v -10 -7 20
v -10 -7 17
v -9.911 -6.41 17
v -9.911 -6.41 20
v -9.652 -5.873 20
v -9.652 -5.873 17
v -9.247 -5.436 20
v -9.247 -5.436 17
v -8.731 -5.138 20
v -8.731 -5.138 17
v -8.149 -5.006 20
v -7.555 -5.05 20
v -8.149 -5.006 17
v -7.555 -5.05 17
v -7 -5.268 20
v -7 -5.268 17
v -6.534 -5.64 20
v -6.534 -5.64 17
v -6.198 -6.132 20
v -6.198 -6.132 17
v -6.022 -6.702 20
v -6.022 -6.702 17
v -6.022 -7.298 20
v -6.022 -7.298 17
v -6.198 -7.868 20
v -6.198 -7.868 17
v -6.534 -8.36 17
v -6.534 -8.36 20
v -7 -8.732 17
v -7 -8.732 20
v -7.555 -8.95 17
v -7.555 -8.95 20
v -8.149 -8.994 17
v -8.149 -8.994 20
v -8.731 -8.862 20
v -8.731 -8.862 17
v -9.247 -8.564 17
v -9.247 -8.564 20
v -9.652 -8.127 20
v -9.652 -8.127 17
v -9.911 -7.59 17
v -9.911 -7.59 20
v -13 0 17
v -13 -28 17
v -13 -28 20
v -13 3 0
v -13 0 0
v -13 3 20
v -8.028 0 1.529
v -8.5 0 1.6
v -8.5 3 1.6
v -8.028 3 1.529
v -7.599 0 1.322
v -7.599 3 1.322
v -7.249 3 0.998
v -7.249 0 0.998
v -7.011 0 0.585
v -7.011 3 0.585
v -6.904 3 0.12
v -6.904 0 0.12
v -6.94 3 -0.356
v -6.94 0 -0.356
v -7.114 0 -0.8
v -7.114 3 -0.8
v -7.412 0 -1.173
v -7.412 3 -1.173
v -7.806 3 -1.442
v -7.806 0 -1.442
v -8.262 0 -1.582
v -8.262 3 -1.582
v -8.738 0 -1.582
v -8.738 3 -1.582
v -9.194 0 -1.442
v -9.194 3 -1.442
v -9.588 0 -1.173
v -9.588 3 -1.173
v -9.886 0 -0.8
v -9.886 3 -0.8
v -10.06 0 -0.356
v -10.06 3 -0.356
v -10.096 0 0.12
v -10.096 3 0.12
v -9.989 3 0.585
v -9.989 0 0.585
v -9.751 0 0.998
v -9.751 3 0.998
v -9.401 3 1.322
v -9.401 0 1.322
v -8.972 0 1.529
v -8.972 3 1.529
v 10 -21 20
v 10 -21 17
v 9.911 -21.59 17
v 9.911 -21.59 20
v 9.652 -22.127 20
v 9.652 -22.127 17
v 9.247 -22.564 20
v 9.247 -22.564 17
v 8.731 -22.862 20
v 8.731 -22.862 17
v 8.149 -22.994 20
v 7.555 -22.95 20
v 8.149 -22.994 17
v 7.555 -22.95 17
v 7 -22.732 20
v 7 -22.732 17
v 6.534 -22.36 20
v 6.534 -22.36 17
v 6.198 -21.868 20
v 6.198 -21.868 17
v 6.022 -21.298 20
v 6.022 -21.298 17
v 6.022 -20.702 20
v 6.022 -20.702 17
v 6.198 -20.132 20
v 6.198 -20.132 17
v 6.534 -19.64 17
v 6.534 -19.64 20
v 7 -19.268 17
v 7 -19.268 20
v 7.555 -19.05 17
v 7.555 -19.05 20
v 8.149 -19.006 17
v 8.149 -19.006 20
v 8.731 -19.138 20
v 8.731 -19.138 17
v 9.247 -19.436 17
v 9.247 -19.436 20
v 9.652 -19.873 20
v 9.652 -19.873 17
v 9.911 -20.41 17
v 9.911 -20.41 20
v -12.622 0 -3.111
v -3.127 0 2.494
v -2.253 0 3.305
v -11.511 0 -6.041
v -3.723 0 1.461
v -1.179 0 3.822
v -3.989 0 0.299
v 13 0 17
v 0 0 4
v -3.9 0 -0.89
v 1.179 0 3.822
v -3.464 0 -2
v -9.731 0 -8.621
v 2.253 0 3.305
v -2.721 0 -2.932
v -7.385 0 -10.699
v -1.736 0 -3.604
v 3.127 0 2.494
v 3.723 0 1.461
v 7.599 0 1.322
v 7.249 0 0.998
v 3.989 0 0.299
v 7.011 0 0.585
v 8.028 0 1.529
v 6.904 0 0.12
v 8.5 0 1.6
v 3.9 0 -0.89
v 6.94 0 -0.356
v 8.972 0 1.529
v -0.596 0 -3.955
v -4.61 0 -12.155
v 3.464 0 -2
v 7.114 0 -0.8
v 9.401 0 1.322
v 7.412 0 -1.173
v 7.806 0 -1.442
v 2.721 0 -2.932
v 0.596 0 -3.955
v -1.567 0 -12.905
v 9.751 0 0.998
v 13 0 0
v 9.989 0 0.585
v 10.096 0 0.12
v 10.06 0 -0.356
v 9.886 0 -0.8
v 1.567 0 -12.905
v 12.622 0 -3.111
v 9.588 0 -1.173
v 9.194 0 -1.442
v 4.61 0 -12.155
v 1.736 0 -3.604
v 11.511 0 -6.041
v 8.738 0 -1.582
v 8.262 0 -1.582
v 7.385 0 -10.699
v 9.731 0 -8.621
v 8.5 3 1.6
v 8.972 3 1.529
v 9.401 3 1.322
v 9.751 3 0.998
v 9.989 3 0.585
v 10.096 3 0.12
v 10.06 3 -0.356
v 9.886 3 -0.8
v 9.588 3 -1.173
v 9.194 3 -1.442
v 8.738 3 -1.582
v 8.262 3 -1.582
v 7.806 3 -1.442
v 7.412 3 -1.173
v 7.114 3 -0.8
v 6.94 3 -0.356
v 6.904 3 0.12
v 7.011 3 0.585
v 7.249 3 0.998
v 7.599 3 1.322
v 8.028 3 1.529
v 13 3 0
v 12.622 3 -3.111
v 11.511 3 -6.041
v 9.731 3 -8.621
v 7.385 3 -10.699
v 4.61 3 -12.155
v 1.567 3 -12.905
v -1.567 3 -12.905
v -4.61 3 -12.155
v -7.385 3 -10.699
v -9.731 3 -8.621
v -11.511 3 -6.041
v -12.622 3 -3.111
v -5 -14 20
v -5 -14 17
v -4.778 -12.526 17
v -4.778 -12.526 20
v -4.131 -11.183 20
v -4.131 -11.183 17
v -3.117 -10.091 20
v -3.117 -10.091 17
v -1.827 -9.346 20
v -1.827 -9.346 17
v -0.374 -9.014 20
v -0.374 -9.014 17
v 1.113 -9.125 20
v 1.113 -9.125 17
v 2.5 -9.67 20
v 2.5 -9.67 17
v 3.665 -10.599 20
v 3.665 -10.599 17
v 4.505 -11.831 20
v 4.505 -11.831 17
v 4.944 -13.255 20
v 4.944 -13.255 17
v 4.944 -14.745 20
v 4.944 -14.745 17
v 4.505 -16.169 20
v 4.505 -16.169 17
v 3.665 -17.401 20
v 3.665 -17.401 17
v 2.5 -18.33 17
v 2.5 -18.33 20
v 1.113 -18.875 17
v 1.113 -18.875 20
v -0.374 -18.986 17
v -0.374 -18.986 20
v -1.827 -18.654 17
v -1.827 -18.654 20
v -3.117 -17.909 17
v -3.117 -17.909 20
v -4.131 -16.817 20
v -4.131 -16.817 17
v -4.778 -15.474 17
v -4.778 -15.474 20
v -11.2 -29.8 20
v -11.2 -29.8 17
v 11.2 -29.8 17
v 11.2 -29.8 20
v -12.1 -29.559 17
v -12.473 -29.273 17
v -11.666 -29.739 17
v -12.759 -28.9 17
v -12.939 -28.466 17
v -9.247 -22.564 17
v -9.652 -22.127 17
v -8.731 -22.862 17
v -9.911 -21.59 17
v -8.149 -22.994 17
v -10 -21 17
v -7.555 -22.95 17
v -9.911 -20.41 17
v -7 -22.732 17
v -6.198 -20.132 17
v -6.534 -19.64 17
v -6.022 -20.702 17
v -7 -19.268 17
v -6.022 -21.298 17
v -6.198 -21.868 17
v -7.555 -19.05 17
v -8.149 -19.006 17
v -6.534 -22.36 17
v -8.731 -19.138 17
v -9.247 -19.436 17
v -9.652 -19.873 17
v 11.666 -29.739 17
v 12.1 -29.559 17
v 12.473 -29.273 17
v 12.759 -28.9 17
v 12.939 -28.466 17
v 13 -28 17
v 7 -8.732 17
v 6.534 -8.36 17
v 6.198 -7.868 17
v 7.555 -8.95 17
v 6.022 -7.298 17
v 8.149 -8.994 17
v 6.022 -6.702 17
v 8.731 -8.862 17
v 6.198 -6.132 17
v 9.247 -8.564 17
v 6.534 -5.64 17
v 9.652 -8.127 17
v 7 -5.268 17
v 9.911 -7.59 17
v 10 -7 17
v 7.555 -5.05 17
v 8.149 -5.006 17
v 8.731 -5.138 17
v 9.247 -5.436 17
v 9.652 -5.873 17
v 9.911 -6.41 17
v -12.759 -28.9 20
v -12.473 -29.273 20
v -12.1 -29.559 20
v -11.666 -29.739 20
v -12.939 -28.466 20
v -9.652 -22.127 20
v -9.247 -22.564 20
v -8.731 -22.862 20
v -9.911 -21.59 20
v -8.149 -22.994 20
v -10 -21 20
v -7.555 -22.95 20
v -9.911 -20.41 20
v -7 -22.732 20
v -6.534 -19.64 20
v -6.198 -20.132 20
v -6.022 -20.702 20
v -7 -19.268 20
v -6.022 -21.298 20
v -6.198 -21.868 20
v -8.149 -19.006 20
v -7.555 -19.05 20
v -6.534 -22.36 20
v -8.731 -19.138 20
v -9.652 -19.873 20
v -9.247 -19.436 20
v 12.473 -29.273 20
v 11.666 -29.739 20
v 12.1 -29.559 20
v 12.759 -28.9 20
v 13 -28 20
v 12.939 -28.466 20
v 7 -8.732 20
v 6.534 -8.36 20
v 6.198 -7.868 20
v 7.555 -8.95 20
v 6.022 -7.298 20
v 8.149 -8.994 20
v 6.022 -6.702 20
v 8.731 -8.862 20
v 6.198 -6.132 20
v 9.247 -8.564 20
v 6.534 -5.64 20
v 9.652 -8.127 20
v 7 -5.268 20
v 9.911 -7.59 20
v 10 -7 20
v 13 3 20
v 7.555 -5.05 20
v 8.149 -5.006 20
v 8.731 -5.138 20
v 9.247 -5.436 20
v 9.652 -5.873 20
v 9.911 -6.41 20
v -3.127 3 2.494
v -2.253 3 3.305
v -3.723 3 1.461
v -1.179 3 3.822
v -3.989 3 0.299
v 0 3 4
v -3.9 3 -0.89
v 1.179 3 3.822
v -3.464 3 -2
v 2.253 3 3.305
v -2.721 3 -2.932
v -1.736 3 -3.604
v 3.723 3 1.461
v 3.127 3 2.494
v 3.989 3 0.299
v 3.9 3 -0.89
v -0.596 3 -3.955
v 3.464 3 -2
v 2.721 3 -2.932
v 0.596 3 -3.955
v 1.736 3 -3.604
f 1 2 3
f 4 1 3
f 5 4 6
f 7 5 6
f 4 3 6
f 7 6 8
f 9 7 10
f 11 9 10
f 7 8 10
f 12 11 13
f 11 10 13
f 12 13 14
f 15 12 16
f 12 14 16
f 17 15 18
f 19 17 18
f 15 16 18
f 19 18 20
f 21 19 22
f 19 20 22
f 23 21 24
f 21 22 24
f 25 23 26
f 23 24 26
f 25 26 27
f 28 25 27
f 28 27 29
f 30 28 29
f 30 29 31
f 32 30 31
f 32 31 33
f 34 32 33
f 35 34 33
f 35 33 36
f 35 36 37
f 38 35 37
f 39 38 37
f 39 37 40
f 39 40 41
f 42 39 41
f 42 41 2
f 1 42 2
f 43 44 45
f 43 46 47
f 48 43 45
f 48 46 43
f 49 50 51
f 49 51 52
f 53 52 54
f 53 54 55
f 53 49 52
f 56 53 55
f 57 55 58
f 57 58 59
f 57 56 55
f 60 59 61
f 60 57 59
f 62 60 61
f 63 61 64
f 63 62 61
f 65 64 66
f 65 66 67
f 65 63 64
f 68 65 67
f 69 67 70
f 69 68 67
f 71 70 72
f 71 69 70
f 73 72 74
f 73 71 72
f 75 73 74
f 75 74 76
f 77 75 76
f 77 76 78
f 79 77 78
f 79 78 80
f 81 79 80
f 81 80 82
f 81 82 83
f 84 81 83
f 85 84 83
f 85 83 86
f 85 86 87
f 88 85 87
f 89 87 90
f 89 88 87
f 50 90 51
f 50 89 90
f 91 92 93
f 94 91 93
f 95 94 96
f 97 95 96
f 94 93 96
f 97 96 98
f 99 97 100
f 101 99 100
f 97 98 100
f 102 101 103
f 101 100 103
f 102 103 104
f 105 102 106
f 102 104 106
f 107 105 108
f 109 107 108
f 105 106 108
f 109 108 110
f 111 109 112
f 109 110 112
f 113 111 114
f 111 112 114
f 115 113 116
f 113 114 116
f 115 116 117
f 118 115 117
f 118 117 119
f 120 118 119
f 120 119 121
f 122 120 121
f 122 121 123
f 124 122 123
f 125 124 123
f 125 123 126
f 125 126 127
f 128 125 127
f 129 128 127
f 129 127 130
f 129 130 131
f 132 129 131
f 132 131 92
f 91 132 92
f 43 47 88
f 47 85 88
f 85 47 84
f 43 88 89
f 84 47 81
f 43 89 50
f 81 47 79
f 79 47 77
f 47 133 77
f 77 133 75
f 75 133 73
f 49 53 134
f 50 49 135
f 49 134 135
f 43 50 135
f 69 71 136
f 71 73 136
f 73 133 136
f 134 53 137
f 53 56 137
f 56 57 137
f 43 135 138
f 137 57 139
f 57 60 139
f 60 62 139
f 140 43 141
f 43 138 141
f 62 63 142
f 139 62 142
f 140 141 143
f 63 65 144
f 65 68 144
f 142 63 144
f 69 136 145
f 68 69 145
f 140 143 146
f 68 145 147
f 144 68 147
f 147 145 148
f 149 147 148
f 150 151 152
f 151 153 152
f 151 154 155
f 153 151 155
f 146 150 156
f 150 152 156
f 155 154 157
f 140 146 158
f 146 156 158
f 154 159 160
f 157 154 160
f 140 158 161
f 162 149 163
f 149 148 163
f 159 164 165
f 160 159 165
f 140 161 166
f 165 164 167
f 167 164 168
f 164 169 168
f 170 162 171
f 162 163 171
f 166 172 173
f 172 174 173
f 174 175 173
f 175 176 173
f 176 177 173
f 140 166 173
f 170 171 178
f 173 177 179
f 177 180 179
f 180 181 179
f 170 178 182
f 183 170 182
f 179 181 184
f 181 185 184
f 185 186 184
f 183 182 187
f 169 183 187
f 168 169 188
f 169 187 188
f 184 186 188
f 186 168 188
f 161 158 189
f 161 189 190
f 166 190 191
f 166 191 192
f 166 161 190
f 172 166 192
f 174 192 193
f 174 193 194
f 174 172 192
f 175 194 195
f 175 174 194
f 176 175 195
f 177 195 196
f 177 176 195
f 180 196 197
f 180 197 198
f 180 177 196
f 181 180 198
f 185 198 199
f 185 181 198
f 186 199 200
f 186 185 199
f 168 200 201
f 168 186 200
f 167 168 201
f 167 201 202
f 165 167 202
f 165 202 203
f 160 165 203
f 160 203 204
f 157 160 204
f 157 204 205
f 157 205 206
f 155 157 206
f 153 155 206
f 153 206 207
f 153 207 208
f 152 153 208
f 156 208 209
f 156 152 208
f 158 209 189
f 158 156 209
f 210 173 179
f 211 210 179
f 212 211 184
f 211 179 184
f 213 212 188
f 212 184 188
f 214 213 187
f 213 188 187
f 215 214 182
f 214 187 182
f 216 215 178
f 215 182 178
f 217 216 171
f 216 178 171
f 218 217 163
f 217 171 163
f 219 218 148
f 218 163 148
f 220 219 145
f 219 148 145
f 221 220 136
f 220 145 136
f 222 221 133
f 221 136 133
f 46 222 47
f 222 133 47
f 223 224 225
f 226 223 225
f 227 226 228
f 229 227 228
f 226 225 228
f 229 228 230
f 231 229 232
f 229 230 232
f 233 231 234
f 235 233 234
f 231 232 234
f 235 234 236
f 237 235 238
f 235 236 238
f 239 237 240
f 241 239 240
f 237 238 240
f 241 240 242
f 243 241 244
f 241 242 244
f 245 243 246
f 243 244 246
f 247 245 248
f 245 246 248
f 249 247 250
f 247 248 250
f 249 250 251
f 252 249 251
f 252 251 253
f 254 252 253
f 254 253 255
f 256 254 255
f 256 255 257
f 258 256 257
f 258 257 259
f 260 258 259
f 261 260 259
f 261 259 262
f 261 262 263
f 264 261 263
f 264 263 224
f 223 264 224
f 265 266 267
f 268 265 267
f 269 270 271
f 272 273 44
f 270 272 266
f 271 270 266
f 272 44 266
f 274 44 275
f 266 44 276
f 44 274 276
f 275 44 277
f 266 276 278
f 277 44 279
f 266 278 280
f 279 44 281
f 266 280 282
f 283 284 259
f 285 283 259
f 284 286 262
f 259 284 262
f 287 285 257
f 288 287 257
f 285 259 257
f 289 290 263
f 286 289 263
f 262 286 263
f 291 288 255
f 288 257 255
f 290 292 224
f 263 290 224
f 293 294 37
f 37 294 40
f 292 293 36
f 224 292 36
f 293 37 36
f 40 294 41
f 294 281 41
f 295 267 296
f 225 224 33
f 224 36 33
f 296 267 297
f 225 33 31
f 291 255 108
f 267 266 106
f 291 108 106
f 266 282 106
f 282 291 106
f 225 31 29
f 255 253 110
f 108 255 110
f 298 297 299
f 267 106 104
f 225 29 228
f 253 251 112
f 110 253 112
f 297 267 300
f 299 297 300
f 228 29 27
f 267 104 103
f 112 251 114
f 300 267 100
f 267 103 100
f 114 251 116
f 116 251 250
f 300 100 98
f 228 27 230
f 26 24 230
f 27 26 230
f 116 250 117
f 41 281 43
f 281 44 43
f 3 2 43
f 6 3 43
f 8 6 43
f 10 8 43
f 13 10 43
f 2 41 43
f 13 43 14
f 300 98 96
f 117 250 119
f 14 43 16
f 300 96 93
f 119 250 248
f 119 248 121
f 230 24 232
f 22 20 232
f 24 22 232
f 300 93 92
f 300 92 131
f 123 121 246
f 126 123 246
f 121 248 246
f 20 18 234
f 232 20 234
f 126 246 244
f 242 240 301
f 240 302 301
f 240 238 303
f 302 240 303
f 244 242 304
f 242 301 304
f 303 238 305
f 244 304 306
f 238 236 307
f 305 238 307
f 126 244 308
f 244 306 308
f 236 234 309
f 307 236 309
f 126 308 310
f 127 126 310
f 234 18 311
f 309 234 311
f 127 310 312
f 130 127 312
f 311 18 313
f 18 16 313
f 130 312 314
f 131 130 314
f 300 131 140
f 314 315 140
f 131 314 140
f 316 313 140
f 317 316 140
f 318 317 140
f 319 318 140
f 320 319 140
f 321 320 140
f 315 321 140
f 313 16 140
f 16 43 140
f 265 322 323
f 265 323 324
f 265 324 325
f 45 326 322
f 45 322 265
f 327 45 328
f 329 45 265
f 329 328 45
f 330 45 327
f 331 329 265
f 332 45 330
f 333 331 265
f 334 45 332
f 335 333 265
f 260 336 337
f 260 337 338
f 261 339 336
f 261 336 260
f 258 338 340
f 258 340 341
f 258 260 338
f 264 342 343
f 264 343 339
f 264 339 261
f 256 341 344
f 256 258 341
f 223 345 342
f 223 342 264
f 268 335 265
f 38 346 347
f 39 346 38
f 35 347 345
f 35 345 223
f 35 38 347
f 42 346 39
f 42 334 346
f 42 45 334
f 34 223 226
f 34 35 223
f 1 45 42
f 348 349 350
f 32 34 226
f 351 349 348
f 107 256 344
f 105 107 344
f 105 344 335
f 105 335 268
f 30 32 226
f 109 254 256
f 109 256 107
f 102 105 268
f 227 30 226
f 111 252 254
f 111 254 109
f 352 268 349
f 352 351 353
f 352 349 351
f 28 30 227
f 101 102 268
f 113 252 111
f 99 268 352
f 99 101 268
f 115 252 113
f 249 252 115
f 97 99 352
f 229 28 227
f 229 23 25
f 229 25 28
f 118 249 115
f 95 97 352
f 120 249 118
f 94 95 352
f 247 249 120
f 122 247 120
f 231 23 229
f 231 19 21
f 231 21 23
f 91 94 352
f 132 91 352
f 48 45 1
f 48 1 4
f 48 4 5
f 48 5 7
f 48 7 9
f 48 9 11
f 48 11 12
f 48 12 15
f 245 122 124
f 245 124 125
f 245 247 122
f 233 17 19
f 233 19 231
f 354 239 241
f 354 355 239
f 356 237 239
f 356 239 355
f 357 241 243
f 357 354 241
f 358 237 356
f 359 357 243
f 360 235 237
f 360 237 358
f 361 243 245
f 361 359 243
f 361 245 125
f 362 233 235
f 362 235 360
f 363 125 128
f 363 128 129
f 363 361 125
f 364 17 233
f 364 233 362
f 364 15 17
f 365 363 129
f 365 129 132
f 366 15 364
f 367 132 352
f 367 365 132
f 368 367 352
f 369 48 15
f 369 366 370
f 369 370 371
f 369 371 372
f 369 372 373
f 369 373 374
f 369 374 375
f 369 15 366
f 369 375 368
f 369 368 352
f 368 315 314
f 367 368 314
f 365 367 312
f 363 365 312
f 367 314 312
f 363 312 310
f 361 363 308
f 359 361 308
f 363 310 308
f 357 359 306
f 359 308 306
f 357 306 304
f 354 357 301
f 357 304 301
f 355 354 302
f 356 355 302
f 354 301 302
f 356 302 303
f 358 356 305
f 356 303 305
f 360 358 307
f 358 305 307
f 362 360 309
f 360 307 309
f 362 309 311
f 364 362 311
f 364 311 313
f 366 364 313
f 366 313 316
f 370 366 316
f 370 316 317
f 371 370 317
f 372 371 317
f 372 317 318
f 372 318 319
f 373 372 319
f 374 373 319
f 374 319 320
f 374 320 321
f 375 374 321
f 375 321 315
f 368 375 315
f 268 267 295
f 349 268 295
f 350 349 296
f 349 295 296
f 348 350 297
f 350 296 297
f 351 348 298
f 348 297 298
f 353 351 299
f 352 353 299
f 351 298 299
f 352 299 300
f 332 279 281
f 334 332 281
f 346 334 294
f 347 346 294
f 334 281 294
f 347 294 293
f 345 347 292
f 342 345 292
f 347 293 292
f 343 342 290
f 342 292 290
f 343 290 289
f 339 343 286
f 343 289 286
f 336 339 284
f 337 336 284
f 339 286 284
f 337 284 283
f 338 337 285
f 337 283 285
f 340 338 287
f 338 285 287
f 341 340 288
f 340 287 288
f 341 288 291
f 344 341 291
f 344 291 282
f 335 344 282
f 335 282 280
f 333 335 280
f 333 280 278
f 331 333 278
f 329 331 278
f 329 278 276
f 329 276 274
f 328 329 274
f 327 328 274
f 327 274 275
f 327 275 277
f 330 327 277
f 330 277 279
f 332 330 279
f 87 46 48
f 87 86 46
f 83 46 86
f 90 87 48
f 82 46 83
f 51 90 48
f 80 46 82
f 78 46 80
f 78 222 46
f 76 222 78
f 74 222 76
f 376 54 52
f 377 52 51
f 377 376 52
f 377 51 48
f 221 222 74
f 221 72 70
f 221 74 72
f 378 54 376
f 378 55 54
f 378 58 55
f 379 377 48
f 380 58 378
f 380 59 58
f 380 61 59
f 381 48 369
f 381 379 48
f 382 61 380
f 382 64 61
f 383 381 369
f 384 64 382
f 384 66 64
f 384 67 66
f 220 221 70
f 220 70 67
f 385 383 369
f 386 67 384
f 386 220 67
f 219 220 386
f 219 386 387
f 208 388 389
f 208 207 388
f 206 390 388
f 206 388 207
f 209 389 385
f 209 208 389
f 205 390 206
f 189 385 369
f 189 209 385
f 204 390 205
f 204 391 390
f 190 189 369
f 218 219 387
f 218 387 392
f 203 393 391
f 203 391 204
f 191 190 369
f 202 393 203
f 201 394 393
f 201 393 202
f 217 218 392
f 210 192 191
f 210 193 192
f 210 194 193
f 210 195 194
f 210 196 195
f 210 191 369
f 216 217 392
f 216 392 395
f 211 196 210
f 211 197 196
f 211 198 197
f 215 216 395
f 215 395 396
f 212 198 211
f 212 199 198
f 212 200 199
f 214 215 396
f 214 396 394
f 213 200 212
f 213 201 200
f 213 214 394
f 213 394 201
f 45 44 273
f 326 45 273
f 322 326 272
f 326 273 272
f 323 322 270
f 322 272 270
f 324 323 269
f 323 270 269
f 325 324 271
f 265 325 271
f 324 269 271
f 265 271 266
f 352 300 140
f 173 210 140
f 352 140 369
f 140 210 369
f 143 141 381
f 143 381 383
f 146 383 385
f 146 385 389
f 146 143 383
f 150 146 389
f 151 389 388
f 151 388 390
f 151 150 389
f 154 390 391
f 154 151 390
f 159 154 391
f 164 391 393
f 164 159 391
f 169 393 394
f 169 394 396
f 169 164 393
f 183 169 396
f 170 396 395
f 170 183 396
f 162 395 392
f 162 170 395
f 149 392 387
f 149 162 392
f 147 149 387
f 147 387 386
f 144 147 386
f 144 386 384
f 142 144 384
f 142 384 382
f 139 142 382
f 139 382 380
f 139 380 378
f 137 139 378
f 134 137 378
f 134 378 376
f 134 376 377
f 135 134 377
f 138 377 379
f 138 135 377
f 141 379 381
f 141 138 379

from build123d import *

# Parameters (mm, degrees)
SKETCH_1_R          = 1.6
SKETCH_1_R_2        = 4
EXTRUDE_1_DEPTH     = 3
SKETCH_2_W          = 26
SKETCH_2_H          = 3
EXTRUDE_2_DEPTH     = 28
SKETCH_3_R          = 5
SKETCH_3_R_2        = 2
CUT_EXTRUDE_1_DEPTH = 44.0464865
EXTRUDE_3_DEPTH     = 3


with BuildPart() as part:
    # 草图1 → 凸台-拉伸1 (new body)
    with BuildSketch(Plane(origin=(0, 0, 0), x_dir=(1, 0, 0), z_dir=(0, 1, 0))):
        with BuildLine():
            ThreePointArc((13, 0), (0, 13), (-13, 0))
            Line((-13, 0), (-13, -20))
            Line((-13, -20), (13, -20))
            Line((13, -20), (13, 0))
        make_face()
        with Locations((8.5, 0)):
            Circle(SKETCH_1_R, mode=Mode.SUBTRACT)
        with Locations((-8.5, 0)):
            Circle(SKETCH_1_R, mode=Mode.SUBTRACT)
        Circle(SKETCH_1_R_2, mode=Mode.SUBTRACT)
    extrude(amount=EXTRUDE_1_DEPTH)

    # 草图2 → 凸台-拉伸2 (add)
    with BuildSketch(Plane.XZ):
        with Locations((0, 18.5)):
            Rectangle(SKETCH_2_W, SKETCH_2_H)
    extrude(amount=EXTRUDE_2_DEPTH)

    # 草图3 → 切除-拉伸1 (cut, through all)
    with BuildSketch(Plane(origin=(0, 0, 17), x_dir=(-1, 0, 0), z_dir=(0, 0, -1))):
        with Locations((0, -14)):
            Circle(SKETCH_3_R)
        with Locations((8, -7)):
            Circle(SKETCH_3_R_2)
        with Locations((8, -21)):
            Circle(SKETCH_3_R_2)
        with Locations((-8, -21)):
            Circle(SKETCH_3_R_2)
        with Locations((-8, -7)):
            Circle(SKETCH_3_R_2)
    extrude(amount=-CUT_EXTRUDE_1_DEPTH, mode=Mode.SUBTRACT)

    # 草图3<4> → 凸台-拉伸3 (add)
    with BuildSketch(Plane(origin=(0, 0, 17), x_dir=(-1, 0, 0), z_dir=(0, 0, -1))):
        with BuildLine():
            Line((13, -28), (-13, -28))
            ThreePointArc((-13, -28), (-12.472792206, -29.272792206), (-11.2, -29.8))
            Line((-11.2, -29.8), (11.2, -29.8))
            ThreePointArc((11.2, -29.8), (12.472792206, -29.272792206), (13, -28))
        make_face()
    extrude(amount=-EXTRUDE_3_DEPTH)


solid = part.part
